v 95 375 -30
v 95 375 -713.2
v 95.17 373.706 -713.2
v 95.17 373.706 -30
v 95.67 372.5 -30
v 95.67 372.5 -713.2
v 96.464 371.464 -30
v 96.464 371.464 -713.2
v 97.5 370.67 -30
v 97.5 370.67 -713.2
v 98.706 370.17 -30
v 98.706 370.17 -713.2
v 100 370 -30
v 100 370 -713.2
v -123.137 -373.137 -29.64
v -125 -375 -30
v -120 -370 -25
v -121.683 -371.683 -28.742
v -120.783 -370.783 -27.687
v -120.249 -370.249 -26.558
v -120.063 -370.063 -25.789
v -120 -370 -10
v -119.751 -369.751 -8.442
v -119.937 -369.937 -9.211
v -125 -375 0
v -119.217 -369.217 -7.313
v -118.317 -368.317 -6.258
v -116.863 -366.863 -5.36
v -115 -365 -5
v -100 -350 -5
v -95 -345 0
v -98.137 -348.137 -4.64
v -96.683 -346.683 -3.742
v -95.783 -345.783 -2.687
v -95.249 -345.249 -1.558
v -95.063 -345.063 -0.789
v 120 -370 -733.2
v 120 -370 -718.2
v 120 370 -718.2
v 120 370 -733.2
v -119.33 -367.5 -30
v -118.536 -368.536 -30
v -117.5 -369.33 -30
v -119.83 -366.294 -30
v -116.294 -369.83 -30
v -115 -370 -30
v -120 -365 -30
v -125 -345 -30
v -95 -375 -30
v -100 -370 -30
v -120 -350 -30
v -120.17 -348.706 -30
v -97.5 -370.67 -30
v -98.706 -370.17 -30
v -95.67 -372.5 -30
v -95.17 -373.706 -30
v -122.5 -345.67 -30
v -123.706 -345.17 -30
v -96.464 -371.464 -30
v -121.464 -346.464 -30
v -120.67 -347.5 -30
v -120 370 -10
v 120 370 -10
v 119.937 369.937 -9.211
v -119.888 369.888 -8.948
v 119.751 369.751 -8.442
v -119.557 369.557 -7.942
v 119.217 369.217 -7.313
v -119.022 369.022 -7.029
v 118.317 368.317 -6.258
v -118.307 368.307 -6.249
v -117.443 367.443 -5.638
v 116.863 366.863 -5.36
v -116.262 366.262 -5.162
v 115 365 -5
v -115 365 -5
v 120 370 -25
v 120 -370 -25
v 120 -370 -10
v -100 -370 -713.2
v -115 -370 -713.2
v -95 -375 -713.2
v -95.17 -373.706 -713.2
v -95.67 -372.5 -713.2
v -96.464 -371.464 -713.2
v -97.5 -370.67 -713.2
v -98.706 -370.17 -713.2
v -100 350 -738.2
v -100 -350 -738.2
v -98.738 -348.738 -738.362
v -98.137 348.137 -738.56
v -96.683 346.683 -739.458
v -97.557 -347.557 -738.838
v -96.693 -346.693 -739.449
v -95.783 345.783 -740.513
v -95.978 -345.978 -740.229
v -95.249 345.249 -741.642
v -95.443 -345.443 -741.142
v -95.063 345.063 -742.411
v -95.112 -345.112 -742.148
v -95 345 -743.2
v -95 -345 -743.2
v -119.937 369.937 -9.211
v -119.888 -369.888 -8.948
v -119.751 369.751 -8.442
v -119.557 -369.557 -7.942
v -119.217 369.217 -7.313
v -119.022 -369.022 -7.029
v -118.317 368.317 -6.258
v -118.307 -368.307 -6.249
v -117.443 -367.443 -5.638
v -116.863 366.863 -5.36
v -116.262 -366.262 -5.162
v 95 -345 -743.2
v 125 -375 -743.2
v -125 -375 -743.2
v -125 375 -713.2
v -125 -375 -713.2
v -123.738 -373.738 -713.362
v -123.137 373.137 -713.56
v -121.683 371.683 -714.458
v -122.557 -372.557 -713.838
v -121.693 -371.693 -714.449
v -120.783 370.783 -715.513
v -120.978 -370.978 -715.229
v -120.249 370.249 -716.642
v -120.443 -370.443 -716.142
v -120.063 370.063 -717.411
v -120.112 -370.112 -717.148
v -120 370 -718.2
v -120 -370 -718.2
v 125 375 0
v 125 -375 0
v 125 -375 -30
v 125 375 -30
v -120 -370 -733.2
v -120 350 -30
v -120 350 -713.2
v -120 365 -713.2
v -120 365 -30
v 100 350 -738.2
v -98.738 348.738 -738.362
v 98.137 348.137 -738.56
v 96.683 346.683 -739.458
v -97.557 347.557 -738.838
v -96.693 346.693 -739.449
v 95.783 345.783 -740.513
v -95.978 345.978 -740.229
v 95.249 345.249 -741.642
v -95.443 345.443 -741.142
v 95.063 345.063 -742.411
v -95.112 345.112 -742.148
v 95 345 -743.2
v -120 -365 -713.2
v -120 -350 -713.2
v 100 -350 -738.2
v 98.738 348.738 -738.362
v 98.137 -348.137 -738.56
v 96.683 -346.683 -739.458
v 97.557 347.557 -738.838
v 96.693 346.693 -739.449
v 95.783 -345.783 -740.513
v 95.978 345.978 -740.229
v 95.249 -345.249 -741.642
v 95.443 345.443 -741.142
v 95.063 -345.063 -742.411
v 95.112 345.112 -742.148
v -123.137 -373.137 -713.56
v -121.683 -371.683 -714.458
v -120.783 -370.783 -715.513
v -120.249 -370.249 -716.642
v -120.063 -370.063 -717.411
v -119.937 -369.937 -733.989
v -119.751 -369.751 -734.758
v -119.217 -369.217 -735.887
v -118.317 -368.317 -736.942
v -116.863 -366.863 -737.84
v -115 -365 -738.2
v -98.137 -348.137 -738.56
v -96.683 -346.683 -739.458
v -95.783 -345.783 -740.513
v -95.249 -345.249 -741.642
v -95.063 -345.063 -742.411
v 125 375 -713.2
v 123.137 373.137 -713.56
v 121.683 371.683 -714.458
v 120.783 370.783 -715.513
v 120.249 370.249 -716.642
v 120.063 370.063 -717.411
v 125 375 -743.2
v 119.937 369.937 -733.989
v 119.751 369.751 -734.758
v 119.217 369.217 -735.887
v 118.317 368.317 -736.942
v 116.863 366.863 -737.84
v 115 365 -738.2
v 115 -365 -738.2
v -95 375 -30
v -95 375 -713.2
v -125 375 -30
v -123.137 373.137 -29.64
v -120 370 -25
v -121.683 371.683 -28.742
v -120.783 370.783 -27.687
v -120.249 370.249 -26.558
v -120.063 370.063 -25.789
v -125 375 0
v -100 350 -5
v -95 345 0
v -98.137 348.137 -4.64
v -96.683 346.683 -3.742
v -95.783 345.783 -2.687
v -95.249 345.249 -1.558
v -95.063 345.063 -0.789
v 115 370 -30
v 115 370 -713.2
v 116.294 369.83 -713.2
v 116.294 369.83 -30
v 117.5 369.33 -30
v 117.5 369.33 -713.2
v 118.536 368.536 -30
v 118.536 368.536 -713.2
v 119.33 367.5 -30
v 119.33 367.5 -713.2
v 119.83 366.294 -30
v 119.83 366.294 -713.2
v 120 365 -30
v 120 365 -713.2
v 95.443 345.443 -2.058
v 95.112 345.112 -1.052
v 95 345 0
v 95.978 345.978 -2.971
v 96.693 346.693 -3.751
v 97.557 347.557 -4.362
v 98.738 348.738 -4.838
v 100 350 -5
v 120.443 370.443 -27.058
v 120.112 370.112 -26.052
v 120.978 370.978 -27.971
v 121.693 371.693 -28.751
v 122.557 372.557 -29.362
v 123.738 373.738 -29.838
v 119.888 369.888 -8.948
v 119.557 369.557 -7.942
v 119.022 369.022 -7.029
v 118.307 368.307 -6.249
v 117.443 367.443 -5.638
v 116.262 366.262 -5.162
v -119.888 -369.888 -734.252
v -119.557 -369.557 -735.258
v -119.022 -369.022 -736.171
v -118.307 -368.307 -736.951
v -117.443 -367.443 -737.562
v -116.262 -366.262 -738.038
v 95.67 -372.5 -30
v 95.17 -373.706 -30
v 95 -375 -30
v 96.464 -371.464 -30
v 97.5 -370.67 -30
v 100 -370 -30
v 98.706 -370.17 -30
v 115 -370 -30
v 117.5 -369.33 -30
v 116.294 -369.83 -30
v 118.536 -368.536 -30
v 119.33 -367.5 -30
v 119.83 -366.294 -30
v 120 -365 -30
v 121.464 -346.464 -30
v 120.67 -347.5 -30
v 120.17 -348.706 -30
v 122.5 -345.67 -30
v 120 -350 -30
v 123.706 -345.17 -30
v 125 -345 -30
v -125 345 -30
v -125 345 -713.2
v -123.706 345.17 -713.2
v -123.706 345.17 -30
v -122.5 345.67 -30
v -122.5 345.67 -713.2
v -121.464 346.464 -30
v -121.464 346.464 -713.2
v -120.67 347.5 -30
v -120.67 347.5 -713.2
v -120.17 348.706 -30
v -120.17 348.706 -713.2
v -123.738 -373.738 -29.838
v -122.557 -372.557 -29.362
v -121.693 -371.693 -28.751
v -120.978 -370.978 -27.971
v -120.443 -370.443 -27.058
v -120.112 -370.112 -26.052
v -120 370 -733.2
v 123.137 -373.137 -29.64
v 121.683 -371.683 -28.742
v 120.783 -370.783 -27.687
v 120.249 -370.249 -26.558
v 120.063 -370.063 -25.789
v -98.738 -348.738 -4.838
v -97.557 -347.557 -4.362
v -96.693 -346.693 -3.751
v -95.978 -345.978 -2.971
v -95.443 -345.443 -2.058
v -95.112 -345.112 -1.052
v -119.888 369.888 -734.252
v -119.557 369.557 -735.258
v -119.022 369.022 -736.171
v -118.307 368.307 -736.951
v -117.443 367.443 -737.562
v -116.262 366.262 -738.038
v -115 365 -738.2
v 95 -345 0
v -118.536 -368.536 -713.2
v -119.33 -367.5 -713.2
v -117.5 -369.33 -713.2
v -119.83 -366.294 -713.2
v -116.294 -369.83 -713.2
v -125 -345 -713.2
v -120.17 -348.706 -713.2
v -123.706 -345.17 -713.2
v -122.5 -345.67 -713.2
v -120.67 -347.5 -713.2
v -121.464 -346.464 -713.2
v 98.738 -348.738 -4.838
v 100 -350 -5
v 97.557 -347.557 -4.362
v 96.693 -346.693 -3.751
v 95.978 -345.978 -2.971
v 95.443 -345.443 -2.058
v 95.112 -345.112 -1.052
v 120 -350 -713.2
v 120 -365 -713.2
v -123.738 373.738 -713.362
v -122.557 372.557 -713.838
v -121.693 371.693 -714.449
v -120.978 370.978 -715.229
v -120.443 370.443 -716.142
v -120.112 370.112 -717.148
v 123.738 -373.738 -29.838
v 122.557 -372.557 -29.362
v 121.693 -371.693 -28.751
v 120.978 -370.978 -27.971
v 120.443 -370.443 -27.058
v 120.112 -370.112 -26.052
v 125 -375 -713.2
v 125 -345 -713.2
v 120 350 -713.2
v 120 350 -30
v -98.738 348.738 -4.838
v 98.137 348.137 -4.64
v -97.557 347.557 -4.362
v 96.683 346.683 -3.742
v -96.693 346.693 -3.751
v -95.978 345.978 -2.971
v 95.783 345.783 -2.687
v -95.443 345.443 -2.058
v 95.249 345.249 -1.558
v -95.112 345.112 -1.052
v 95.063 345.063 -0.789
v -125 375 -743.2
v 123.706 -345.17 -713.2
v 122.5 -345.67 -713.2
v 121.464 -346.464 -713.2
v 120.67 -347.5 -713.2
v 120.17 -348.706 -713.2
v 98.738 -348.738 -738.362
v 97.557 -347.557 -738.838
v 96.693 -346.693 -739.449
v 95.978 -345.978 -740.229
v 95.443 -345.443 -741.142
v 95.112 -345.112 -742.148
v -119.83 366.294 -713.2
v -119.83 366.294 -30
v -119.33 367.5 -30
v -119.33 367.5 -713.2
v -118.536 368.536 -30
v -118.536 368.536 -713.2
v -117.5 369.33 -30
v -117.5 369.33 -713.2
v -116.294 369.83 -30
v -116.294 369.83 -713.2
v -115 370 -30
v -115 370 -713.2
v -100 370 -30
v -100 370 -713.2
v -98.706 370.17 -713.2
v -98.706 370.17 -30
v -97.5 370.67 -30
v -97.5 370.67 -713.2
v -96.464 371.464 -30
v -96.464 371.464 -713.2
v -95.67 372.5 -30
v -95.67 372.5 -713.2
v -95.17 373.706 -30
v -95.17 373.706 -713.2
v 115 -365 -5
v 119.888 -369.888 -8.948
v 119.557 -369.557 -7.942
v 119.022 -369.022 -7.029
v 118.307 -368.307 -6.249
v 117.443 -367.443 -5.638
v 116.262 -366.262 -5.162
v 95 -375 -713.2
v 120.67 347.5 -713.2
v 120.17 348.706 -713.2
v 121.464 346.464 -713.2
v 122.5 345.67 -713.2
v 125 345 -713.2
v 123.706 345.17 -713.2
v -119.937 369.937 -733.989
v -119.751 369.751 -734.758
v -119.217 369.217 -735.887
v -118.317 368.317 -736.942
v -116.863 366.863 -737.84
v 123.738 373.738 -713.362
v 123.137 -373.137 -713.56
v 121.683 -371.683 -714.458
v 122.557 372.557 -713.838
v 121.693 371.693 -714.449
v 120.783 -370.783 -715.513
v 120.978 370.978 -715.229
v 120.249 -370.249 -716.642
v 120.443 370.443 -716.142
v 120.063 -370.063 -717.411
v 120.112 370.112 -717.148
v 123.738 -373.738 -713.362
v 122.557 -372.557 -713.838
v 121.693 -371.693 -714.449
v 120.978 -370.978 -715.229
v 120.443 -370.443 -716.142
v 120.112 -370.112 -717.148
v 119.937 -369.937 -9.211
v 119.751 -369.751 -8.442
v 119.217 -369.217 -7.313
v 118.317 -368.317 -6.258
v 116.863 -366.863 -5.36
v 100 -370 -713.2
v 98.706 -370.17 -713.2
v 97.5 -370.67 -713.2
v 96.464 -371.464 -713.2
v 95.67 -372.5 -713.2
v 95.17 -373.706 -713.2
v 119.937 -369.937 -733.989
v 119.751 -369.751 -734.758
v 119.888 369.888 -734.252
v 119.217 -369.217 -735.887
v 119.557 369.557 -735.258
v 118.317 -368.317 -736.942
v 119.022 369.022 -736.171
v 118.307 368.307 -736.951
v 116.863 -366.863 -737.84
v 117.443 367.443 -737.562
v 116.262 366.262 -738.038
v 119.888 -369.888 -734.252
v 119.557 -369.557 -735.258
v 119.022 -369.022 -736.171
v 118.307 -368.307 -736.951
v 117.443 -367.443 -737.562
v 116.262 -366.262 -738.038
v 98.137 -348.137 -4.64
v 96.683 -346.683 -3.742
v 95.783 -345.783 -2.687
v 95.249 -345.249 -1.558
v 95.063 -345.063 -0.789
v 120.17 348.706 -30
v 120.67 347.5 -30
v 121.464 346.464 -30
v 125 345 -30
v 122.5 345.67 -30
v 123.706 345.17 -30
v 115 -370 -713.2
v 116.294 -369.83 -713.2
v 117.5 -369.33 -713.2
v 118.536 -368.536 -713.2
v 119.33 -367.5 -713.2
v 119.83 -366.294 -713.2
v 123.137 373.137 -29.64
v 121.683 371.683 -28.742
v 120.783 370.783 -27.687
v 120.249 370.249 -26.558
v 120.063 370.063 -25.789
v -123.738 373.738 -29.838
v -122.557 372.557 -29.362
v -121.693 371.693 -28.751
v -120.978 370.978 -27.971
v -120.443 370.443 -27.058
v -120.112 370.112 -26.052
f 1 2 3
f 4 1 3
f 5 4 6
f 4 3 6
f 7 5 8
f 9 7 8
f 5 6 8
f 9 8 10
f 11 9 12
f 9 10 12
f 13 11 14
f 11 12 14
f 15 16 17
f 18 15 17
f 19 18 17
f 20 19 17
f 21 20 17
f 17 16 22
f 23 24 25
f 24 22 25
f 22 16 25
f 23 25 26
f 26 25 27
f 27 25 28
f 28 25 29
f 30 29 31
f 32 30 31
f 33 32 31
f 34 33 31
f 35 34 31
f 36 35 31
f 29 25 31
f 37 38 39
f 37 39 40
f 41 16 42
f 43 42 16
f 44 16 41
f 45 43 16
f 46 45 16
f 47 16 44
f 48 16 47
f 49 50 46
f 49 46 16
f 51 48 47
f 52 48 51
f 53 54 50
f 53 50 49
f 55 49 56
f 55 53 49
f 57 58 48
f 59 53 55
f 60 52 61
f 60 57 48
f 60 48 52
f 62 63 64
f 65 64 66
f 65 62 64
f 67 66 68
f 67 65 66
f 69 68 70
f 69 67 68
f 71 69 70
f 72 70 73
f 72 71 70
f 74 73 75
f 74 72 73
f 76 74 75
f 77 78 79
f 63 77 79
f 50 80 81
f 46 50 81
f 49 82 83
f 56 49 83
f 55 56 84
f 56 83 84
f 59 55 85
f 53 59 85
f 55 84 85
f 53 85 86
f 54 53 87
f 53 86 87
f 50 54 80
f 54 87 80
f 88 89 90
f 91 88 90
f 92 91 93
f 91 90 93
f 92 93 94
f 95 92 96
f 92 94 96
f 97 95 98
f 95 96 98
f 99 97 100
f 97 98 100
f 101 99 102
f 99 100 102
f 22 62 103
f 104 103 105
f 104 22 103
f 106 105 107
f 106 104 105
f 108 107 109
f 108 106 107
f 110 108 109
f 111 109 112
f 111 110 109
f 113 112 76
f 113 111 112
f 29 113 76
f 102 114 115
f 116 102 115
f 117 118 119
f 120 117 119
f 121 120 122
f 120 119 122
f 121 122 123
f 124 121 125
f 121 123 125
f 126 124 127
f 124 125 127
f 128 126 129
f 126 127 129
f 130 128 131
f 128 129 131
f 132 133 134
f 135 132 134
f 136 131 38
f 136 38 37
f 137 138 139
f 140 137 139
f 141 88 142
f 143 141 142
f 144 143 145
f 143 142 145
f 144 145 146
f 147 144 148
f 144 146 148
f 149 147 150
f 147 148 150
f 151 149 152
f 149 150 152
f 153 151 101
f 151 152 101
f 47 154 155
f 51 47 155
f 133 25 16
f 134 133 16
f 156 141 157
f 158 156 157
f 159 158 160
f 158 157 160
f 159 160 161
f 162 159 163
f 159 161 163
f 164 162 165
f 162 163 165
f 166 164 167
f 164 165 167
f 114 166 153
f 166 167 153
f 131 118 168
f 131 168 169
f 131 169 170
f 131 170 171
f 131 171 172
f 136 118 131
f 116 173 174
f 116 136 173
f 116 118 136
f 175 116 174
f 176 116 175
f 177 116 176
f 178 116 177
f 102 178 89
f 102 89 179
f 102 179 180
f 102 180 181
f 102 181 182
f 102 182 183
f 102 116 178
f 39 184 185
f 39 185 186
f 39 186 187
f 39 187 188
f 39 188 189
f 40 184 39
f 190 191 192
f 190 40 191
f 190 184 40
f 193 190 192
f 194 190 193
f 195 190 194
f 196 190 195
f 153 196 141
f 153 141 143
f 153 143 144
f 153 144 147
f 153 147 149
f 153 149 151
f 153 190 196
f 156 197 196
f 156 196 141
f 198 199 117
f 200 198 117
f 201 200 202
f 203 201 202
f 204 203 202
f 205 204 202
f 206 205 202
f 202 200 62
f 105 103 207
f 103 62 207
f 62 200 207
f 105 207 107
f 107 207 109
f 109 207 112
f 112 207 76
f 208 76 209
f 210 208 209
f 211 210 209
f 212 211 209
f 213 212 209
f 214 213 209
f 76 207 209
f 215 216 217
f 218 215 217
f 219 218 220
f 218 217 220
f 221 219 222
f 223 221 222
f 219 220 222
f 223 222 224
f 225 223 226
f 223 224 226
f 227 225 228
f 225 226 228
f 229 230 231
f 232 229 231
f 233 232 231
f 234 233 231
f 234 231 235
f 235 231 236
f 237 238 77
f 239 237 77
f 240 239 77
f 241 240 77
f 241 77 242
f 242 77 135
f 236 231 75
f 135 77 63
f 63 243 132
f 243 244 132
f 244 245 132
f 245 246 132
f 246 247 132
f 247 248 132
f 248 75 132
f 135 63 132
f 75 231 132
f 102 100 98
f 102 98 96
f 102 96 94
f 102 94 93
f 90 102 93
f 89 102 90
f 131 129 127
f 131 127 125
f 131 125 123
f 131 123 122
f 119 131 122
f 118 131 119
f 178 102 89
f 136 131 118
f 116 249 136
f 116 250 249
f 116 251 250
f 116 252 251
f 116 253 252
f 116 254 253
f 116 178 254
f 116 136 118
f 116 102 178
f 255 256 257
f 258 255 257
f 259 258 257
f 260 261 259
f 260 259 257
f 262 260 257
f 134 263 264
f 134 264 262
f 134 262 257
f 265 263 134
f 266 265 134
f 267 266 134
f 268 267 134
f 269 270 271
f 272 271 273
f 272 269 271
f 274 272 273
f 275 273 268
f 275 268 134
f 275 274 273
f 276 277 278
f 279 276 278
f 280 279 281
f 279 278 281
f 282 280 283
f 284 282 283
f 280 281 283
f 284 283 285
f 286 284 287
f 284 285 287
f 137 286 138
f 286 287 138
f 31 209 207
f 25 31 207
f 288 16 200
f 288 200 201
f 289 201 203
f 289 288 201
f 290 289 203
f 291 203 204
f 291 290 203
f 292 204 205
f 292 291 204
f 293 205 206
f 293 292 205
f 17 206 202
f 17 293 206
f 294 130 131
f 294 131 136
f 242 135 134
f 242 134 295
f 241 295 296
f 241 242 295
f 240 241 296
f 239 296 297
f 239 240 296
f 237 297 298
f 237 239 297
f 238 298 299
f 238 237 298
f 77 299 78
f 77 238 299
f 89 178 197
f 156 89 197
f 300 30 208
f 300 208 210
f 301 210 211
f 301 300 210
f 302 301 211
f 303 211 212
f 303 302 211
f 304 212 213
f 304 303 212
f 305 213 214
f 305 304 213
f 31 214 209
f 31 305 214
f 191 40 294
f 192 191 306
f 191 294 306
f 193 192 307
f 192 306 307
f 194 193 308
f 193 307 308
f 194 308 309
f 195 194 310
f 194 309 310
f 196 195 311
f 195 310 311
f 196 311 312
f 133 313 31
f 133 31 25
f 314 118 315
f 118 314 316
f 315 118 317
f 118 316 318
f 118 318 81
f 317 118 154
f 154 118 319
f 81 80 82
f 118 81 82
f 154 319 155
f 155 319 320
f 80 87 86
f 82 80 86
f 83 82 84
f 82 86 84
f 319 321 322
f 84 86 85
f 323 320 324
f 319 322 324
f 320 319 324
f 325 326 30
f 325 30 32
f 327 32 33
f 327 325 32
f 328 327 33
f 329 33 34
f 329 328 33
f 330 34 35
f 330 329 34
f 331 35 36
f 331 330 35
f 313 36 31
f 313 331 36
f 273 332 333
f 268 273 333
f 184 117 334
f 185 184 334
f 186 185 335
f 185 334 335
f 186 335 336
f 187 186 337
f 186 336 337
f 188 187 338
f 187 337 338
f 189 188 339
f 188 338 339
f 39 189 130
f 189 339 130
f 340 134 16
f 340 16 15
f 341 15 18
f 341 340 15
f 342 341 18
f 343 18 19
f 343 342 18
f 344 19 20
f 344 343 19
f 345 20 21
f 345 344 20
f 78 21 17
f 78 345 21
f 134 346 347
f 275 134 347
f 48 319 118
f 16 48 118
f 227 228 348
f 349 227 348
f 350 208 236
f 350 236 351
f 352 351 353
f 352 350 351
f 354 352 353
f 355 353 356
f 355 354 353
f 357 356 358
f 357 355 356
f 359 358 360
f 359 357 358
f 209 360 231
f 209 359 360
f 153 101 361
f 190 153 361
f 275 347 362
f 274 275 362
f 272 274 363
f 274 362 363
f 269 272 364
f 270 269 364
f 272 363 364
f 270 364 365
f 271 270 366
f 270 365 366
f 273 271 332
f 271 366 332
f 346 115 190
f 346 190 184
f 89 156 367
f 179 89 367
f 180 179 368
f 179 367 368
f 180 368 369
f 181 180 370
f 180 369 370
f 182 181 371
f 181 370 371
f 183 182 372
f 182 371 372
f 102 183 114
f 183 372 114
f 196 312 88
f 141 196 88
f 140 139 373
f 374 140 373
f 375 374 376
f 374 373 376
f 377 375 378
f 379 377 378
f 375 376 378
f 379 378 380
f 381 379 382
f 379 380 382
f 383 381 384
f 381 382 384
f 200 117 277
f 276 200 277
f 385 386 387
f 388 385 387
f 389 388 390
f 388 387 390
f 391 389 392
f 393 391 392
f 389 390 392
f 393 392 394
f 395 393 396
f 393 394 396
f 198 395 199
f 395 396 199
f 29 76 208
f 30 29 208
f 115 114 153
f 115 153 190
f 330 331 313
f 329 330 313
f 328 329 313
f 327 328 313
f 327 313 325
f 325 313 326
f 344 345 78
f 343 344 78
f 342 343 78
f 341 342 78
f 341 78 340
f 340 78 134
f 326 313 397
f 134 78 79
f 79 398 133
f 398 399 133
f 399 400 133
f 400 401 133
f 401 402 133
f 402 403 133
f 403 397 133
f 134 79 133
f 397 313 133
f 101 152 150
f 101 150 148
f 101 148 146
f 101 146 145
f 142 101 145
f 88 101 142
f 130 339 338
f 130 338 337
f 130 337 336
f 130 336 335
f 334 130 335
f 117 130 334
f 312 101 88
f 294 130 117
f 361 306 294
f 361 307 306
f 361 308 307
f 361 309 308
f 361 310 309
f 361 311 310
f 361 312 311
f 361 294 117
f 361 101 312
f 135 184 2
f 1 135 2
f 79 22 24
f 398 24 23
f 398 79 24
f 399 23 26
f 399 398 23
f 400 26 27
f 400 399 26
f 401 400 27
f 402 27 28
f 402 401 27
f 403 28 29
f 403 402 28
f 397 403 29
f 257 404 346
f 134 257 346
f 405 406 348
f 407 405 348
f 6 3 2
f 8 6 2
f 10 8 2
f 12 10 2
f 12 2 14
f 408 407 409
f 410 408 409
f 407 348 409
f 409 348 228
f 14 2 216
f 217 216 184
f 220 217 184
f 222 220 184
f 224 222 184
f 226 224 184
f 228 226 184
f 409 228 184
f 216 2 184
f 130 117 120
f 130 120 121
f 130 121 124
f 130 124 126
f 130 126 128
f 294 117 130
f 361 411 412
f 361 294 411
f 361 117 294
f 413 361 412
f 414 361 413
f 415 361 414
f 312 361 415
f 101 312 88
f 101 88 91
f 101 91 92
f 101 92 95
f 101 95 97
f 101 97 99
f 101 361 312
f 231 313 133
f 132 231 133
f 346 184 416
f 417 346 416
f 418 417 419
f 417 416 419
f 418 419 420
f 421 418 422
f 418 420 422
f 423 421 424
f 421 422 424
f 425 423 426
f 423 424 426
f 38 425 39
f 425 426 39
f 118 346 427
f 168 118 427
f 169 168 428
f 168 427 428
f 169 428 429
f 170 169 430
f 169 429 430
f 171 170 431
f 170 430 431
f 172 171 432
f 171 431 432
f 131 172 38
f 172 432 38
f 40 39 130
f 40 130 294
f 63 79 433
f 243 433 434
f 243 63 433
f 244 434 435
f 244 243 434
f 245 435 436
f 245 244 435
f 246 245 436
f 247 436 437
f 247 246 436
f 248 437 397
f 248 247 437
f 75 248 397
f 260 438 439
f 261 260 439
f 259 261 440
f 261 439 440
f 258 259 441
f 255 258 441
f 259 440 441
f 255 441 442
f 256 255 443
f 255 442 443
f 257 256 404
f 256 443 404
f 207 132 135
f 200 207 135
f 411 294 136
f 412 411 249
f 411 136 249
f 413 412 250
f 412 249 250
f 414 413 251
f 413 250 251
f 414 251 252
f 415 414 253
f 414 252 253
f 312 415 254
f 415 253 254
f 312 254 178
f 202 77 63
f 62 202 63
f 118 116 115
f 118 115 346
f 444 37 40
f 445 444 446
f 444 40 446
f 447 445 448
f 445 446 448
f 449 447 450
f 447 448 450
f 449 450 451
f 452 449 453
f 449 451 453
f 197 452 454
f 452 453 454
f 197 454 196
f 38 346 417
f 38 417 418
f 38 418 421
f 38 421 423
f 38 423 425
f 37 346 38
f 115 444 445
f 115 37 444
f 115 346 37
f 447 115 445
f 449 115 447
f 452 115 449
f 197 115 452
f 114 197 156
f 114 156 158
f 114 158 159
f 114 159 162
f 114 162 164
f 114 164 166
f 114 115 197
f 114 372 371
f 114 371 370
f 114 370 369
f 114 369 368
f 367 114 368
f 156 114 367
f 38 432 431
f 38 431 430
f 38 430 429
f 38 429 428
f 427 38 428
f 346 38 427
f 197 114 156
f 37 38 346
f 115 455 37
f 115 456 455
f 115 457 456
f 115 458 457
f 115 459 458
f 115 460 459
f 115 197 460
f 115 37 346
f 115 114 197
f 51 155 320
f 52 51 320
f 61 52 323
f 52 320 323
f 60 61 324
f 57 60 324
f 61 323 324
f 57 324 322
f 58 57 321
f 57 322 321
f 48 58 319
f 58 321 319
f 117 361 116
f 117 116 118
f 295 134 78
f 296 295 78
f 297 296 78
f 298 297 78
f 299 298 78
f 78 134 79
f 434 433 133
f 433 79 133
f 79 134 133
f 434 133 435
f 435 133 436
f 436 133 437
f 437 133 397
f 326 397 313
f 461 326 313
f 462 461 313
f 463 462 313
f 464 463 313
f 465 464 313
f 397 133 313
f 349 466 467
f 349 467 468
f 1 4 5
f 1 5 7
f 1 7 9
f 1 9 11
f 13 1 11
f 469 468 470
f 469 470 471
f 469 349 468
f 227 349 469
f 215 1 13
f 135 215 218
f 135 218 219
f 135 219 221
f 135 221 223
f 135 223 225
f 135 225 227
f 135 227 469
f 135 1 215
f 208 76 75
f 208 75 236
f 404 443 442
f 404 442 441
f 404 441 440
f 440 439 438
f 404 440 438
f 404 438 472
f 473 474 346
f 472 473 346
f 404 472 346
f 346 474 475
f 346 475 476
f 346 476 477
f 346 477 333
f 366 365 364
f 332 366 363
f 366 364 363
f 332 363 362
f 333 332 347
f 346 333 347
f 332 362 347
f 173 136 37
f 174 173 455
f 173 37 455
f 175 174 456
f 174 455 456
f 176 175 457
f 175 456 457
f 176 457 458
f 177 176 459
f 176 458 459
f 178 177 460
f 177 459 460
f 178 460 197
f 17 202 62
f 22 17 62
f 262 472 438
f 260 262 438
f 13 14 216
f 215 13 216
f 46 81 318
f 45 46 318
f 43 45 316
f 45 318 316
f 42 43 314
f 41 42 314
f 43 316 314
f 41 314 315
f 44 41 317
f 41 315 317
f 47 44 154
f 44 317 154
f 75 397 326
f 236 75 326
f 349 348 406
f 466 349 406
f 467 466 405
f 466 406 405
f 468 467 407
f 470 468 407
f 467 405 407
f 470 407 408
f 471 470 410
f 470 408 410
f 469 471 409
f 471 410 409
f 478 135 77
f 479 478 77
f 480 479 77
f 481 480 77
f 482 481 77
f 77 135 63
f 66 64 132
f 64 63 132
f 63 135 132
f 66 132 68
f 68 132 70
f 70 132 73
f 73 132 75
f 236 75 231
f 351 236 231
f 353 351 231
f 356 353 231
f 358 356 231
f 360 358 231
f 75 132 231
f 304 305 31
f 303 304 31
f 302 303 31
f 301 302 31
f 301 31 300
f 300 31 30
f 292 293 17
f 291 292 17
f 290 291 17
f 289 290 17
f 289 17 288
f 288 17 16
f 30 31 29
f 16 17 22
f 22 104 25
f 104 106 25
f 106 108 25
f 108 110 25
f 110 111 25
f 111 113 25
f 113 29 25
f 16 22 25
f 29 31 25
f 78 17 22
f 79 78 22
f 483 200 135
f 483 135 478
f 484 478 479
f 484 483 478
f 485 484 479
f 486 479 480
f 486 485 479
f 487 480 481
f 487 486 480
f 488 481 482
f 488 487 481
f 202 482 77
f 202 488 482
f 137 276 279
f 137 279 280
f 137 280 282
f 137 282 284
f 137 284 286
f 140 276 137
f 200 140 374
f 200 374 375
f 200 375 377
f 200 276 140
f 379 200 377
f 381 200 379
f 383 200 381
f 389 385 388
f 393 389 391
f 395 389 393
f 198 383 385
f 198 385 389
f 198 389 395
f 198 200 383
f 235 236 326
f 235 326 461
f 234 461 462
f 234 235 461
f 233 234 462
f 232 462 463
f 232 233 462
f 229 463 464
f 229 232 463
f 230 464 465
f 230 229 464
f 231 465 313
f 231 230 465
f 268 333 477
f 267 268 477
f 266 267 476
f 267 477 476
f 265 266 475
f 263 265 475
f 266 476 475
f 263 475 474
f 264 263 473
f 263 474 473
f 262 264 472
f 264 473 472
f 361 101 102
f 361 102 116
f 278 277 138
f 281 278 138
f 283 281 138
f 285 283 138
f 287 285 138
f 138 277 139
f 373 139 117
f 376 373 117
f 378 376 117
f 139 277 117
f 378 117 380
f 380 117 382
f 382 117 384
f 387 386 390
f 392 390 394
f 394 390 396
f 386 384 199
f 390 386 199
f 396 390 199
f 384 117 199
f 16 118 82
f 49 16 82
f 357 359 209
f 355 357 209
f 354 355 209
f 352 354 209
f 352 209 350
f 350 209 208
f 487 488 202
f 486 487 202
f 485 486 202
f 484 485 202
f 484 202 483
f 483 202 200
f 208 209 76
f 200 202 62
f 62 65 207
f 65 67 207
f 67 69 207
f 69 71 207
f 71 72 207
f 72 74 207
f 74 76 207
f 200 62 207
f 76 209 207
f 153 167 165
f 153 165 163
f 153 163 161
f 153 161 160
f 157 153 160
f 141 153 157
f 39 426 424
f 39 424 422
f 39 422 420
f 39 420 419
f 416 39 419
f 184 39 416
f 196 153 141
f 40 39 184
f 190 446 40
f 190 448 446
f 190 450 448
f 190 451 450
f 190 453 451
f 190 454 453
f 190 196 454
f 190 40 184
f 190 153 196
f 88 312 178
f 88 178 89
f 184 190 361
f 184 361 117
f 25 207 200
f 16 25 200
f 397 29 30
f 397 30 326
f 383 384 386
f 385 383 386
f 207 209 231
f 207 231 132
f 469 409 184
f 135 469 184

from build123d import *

# Parameters (mm, degrees)
ANGLE_IRON_CONFIGURED_35_X_35_X_5_1_DEPTH      = 293.426406871
ANGLE_IRON_CONFIGURED_35_X_35_X_5_1_DEPTH_BACK = 43.426406871
ANGLE_IRON_CONFIGURED_35_X_35_X_5_1_2_DEPTH    = 836.852813742
ANGLE_IRON_CONFIGURED_35_X_35_X_5_1_3_DEPTH    = 336.852813742
ANGLE_IRON_CONFIGURED_35_X_35_X_5_1_4_DEPTH    = 836.852813742
ANGLE_START                                    = -713.2
ANGLE_IRON_CONFIGURED_35_X_35_X_5_9_DEPTH      = 683.2


# Read off the part's stored shape, not the designer's step: Angle iron - configured 35 X 35 X 5(2)
with BuildPart() as part:
    # Sketch11 → Angle iron - configured 35 X 35 X 5(1) (new, two sides: drawn at the far end of the back side and taken through both)
    with BuildSketch(Plane(origin=(-125, 375, 0), x_dir=(0, -1, 0), z_dir=(1, 0, 0)).offset(-ANGLE_IRON_CONFIGURED_35_X_35_X_5_1_DEPTH_BACK)):
        with BuildLine():
            Line((0, 0), (0, 30))
            ThreePointArc((0, 30), (3.535533906, 28.535533906), (5, 25))
            Line((5, 25), (5, 10))
            ThreePointArc((5, 10), (6.464466094, 6.464466094), (10, 5))
            Line((10, 5), (25, 5))
            ThreePointArc((25, 5), (28.535533906, 3.535533906), (30, 0))
            Line((30, 0), (0, 0))
        make_face()
    extrude(amount=ANGLE_IRON_CONFIGURED_35_X_35_X_5_1_DEPTH + ANGLE_IRON_CONFIGURED_35_X_35_X_5_1_DEPTH_BACK)

    # Angle iron - configured 35 X 35 X 5(1) mi
    split(bisect_by=Plane(origin=(-125, 375, 0), x_dir=(-0.707106781, 0.707106781, 0), z_dir=(0.707106781, 0.707106781, 0)), keep=Keep.TOP)

    # Angle iron - configured 35 X 35 X 5_ 2
    split(bisect_by=Plane(origin=(125, 375, 0), x_dir=(-0.707106781, -0.707106781, 0), z_dir=(-0.707106781, 0.707106781, 0)), keep=Keep.TOP)


with BuildPart() as body_2:
    # Sketch11 on segment 2 (carried to segment 2) → Angle iron - configured 35 X 35 X 5_1 2 (new body)
    with BuildSketch(Plane(origin=(125, 418.426406871, 0), x_dir=(-1, 0, 0), z_dir=(0, -1, 0))):
        with BuildLine():
            Line((0, 0), (0, 30))
            ThreePointArc((0, 30), (3.535533906, 28.535533906), (5, 25))
            Line((5, 25), (5, 10))
            ThreePointArc((5, 10), (6.464466094, 6.464466094), (10, 5))
            Line((10, 5), (25, 5))
            ThreePointArc((25, 5), (28.535533906, 3.535533906), (30, 0))
            Line((30, 0), (0, 0))
        make_face()
    extrude(amount=ANGLE_IRON_CONFIGURED_35_X_35_X_5_1_2_DEPTH)

    # Angle iron - configured 35 X 35 X 5_ 3
    split(bisect_by=Plane(origin=(125, -375, 0), x_dir=(-0.707106781, 0.707106781, 0), z_dir=(0.707106781, 0.707106781, 0)), keep=Keep.TOP)

    # Angle iron - configured 35 X 35 X 5_ 4
    split(bisect_by=Plane(origin=(125, 375, 0), x_dir=(0.707106781, 0.707106781, 0), z_dir=(0.707106781, -0.707106781, 0)), keep=Keep.TOP)


with BuildPart() as body_3:
    # Sketch11 on segment 3 (carried to segment 3) → Angle iron - configured 35 X 35 X 5_1 3 (new body)
    with BuildSketch(Plane(origin=(168.426406871, -375, 0), x_dir=(0, 1, 0), z_dir=(-1, 0, 0))):
        with BuildLine():
            Line((0, 0), (0, 30))
            ThreePointArc((0, 30), (3.535533906, 28.535533906), (5, 25))
            Line((5, 25), (5, 10))
            ThreePointArc((5, 10), (6.464466094, 6.464466094), (10, 5))
            Line((10, 5), (25, 5))
            ThreePointArc((25, 5), (28.535533906, 3.535533906), (30, 0))
            Line((30, 0), (0, 0))
        make_face()
    extrude(amount=ANGLE_IRON_CONFIGURED_35_X_35_X_5_1_3_DEPTH)

    # Angle iron - configured 35 X 35 X 5_ 5
    split(bisect_by=Plane(origin=(-125, -375, 0), x_dir=(0.707106781, 0.707106781, 0), z_dir=(0.707106781, -0.707106781, 0)), keep=Keep.TOP)

    # Angle iron - configured 35 X 35 X 5_ 6
    split(bisect_by=Plane(origin=(125, -375, 0), x_dir=(0.707106781, -0.707106781, 0), z_dir=(-0.707106781, -0.707106781, 0)), keep=Keep.TOP)


with BuildPart() as body_4:
    # Sketch11 on segment 4 (carried to segment 4) → Angle iron - configured 35 X 35 X 5_1 4 (new body)
    with BuildSketch(Plane(origin=(-125, -418.426406871, 0), x_dir=(1, 0, 0), z_dir=(0, 1, 0))):
        with BuildLine():
            Line((0, 0), (0, 30))
            ThreePointArc((0, 30), (3.535533906, 28.535533906), (5, 25))
            Line((5, 25), (5, 10))
            ThreePointArc((5, 10), (6.464466094, 6.464466094), (10, 5))
            Line((10, 5), (25, 5))
            ThreePointArc((25, 5), (28.535533906, 3.535533906), (30, 0))
            Line((30, 0), (0, 0))
        make_face()
    extrude(amount=ANGLE_IRON_CONFIGURED_35_X_35_X_5_1_4_DEPTH)

    # Angle iron - configured 35 X 35 X 5_ 7
    split(bisect_by=Plane(origin=(-125, -375, 0), x_dir=(-0.707106781, -0.707106781, 0), z_dir=(-0.707106781, 0.707106781, 0)), keep=Keep.TOP)

    # Angle iron - configured 35 X 35 X 5_ 8
    split(bisect_by=Plane(origin=(-125, 375, 0), x_dir=(0.707106781, -0.707106781, 0), z_dir=(-0.707106781, -0.707106781, 0)), keep=Keep.TOP)


with BuildPart() as body_5:
    # Mirror1: mirrored copy
    add(body_4.part.mirror(Plane.XY.offset(-371.6)))


with BuildPart() as body_6:
    # Mirror1 2: mirrored copy
    add(part.part.mirror(Plane.XY.offset(-371.6)))


with BuildPart() as body_7:
    # Mirror1 3: mirrored copy
    add(body_2.part.mirror(Plane.XY.offset(-371.6)))


with BuildPart() as body_8:
    # Mirror1 4: mirrored copy
    add(body_3.part.mirror(Plane.XY.offset(-371.6)))


with BuildPart() as body_9:
    # Angle iron - configured 35 X 35 X 5_ 9 o → Angle iron - configured 35 X 35 X 5_ 9 (new body)
    with BuildSketch(Plane.XY.offset(ANGLE_START)):
        with BuildLine():
            Line((-125, -345), (-125, -375))
            Line((-125, -375), (-95, -375))
            ThreePointArc((-95, -375), (-96.464466094, -371.464466094), (-100, -370))
            Line((-100, -370), (-115, -370))
            ThreePointArc((-115, -370), (-118.535533906, -368.535533906), (-120, -365))
            Line((-120, -365), (-120, -350))
            ThreePointArc((-120, -350), (-121.464466094, -346.464466094), (-125, -345))
        make_face()
        with BuildLine():
            Line((-125, 375), (-125, 345))
            ThreePointArc((-125, 345), (-121.464466094, 346.464466094), (-120, 350))
            Line((-120, 350), (-120, 365))
            ThreePointArc((-120, 365), (-118.535533906, 368.535533906), (-115, 370))
            Line((-115, 370), (-100, 370))
            ThreePointArc((-100, 370), (-96.464466094, 371.464466094), (-95, 375))
            Line((-95, 375), (-125, 375))
        make_face()
        with BuildLine():
            Line((115, -370), (100, -370))
            ThreePointArc((100, -370), (96.464466094, -371.464466094), (95, -375))
            Line((95, -375), (125, -375))
            Line((125, -375), (125, -345))
            ThreePointArc((125, -345), (121.464466094, -346.464466094), (120, -350))
            Line((120, -350), (120, -365))
            ThreePointArc((120, -365), (118.535533906, -368.535533906), (115, -370))
        make_face()
        with BuildLine():
            Line((125, 345), (125, 375))
            Line((125, 375), (95, 375))
            ThreePointArc((95, 375), (96.464466094, 371.464466094), (100, 370))
            Line((100, 370), (115, 370))
            ThreePointArc((115, 370), (118.535533906, 368.535533906), (120, 365))
            Line((120, 365), (120, 350))
            ThreePointArc((120, 350), (121.464466094, 346.464466094), (125, 345))
        make_face()
    extrude(amount=ANGLE_IRON_CONFIGURED_35_X_35_X_5_9_DEPTH)


solid = Compound([part.part, body_2.part, body_3.part, body_4.part, body_5.part, body_6.part, body_7.part, body_8.part, body_9.part])
